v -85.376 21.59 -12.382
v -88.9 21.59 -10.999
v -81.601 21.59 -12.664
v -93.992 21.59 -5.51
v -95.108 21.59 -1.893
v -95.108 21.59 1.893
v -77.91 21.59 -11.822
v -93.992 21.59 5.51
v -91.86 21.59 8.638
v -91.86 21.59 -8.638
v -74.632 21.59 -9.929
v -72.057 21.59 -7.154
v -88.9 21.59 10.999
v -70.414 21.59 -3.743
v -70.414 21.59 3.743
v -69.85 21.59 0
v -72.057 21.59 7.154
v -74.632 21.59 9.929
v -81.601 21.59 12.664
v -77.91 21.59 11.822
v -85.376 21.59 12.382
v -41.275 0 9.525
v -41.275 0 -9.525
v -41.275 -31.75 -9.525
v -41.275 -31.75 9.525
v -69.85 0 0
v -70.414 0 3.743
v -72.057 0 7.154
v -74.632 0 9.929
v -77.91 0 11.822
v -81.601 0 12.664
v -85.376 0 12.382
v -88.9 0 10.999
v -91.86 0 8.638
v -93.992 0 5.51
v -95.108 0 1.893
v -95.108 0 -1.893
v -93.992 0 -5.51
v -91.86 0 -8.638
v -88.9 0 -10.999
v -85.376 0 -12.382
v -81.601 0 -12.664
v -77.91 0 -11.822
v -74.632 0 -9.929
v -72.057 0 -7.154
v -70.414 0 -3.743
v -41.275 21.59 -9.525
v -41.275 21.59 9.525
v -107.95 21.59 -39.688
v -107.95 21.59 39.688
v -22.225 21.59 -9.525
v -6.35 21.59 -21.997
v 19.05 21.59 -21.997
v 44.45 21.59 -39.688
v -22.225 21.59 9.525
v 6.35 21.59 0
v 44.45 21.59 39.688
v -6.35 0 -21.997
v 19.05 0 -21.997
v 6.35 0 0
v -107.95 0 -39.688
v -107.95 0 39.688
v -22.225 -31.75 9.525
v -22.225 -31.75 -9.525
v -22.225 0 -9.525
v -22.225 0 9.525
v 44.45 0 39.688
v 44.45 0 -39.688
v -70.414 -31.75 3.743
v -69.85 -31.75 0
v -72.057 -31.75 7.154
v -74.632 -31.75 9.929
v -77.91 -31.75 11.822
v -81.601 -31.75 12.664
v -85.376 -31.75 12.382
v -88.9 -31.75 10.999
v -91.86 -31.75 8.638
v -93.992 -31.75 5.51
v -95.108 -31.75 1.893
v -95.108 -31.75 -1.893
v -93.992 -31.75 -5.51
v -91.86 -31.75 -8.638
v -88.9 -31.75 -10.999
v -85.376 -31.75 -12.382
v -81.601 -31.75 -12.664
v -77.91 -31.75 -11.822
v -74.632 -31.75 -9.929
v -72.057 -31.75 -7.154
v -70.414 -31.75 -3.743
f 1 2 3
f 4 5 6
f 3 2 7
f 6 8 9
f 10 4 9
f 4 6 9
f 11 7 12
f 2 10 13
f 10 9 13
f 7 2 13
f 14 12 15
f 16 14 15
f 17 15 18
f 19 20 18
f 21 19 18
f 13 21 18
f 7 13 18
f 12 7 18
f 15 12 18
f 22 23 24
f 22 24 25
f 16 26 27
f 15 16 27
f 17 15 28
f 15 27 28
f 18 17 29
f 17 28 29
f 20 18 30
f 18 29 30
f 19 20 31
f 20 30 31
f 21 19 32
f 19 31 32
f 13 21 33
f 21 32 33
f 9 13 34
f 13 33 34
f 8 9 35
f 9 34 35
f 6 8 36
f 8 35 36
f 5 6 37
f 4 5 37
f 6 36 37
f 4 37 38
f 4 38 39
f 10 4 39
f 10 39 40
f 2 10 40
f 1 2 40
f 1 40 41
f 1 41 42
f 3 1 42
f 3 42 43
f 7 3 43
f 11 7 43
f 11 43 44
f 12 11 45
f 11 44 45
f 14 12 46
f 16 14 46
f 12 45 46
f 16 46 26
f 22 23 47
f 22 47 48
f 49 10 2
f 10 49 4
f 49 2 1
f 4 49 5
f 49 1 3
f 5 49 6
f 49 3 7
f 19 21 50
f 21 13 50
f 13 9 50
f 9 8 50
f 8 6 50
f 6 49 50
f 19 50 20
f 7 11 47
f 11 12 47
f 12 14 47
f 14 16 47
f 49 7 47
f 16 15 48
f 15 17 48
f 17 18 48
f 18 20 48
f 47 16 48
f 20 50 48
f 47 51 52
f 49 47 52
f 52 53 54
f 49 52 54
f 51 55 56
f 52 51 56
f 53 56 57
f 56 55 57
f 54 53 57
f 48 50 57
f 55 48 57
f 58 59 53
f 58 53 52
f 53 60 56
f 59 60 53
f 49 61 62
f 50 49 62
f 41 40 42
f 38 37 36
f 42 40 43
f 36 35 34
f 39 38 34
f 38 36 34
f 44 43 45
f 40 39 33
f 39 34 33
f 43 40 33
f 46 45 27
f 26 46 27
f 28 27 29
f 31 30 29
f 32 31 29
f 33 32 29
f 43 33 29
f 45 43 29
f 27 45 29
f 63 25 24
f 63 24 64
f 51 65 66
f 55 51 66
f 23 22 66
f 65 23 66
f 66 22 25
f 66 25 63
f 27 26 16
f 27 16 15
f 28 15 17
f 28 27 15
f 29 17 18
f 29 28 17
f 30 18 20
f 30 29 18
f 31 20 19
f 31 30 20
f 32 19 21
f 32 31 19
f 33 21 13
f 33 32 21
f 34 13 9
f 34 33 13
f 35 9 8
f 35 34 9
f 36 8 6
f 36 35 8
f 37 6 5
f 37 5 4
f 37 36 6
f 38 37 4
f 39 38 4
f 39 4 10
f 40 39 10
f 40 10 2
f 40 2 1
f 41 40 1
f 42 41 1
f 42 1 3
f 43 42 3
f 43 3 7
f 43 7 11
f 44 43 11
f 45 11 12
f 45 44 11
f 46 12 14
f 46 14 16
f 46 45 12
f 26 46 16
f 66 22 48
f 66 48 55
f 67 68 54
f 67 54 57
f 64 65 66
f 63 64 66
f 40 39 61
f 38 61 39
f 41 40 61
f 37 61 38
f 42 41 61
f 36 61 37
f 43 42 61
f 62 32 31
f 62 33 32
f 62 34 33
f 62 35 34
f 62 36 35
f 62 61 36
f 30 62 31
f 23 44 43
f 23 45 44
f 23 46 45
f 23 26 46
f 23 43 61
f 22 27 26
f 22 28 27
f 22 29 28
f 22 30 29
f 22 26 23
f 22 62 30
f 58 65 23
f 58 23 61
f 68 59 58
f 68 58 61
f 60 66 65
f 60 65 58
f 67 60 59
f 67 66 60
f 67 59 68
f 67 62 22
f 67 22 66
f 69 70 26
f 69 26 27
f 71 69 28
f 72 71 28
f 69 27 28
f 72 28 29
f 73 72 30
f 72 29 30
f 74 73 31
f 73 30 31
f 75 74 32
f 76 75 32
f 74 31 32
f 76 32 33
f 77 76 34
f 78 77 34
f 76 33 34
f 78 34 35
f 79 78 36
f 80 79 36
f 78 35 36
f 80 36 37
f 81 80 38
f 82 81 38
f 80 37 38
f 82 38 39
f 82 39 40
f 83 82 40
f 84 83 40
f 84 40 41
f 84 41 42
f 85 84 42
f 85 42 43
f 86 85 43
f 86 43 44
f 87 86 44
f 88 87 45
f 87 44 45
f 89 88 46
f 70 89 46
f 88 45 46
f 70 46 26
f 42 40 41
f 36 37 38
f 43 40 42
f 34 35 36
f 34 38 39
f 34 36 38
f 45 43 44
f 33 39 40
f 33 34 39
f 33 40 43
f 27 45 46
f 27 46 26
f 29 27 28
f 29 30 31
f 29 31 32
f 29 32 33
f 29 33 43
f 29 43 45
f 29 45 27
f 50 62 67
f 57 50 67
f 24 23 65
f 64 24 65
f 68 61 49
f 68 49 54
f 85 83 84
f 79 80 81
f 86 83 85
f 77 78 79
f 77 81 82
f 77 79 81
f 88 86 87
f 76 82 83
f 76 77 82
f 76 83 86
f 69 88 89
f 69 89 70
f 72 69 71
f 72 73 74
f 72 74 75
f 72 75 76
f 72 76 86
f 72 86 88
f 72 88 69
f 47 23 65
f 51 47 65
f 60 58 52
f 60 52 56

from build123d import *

# Parameters (mm, degrees)
F0_W     = 152.4
F0_H     = 79.375
F0_R     = 12.7
F0_W_2   = 19.05
F0_H_2   = 19.05
F1_DEPTH = 21.59
F2_DEPTH = 31.75
F3_DEPTH = 21.59
F4_DEPTH = 31.75


with BuildPart() as f1:
    # F0 (on Front) → F1 (new body)
    with BuildSketch(Plane.XZ):
        with Locations((-31.75, 0)):
            Rectangle(F0_W, F0_H)
        Polygon((-6.35, -21.997045), (6.35, 0), (19.05, -21.997045), align=None, mode=Mode.SUBTRACT)
        with Locations((-82.55, 0)):
            Circle(F0_R, mode=Mode.SUBTRACT)
        with Locations((-31.75, 0)):
            Rectangle(F0_W_2, F0_H_2, mode=Mode.SUBTRACT)
    extrude(amount=-F1_DEPTH)

    # F0 (on Front) → F2 (join)
    with BuildSketch(Plane.XZ):
        with Locations((-82.55, 0)):
            Circle(F0_R)
    extrude(amount=F2_DEPTH)


with BuildPart() as f3:
    # F0 (on Front) → F3 (new body)
    with BuildSketch(Plane.XZ):
        with Locations((-82.55, 0)):
            Circle(F0_R)
    extrude(amount=-F3_DEPTH)


with BuildPart() as f4:
    # F0 (on Front) → F4 (new body)
    with BuildSketch(Plane.XZ):
        with Locations((-31.75, 0)):
            Rectangle(F0_W_2, F0_H_2)
    extrude(amount=F4_DEPTH)


solid = Compound([f1.part, f3.part, f4.part])
